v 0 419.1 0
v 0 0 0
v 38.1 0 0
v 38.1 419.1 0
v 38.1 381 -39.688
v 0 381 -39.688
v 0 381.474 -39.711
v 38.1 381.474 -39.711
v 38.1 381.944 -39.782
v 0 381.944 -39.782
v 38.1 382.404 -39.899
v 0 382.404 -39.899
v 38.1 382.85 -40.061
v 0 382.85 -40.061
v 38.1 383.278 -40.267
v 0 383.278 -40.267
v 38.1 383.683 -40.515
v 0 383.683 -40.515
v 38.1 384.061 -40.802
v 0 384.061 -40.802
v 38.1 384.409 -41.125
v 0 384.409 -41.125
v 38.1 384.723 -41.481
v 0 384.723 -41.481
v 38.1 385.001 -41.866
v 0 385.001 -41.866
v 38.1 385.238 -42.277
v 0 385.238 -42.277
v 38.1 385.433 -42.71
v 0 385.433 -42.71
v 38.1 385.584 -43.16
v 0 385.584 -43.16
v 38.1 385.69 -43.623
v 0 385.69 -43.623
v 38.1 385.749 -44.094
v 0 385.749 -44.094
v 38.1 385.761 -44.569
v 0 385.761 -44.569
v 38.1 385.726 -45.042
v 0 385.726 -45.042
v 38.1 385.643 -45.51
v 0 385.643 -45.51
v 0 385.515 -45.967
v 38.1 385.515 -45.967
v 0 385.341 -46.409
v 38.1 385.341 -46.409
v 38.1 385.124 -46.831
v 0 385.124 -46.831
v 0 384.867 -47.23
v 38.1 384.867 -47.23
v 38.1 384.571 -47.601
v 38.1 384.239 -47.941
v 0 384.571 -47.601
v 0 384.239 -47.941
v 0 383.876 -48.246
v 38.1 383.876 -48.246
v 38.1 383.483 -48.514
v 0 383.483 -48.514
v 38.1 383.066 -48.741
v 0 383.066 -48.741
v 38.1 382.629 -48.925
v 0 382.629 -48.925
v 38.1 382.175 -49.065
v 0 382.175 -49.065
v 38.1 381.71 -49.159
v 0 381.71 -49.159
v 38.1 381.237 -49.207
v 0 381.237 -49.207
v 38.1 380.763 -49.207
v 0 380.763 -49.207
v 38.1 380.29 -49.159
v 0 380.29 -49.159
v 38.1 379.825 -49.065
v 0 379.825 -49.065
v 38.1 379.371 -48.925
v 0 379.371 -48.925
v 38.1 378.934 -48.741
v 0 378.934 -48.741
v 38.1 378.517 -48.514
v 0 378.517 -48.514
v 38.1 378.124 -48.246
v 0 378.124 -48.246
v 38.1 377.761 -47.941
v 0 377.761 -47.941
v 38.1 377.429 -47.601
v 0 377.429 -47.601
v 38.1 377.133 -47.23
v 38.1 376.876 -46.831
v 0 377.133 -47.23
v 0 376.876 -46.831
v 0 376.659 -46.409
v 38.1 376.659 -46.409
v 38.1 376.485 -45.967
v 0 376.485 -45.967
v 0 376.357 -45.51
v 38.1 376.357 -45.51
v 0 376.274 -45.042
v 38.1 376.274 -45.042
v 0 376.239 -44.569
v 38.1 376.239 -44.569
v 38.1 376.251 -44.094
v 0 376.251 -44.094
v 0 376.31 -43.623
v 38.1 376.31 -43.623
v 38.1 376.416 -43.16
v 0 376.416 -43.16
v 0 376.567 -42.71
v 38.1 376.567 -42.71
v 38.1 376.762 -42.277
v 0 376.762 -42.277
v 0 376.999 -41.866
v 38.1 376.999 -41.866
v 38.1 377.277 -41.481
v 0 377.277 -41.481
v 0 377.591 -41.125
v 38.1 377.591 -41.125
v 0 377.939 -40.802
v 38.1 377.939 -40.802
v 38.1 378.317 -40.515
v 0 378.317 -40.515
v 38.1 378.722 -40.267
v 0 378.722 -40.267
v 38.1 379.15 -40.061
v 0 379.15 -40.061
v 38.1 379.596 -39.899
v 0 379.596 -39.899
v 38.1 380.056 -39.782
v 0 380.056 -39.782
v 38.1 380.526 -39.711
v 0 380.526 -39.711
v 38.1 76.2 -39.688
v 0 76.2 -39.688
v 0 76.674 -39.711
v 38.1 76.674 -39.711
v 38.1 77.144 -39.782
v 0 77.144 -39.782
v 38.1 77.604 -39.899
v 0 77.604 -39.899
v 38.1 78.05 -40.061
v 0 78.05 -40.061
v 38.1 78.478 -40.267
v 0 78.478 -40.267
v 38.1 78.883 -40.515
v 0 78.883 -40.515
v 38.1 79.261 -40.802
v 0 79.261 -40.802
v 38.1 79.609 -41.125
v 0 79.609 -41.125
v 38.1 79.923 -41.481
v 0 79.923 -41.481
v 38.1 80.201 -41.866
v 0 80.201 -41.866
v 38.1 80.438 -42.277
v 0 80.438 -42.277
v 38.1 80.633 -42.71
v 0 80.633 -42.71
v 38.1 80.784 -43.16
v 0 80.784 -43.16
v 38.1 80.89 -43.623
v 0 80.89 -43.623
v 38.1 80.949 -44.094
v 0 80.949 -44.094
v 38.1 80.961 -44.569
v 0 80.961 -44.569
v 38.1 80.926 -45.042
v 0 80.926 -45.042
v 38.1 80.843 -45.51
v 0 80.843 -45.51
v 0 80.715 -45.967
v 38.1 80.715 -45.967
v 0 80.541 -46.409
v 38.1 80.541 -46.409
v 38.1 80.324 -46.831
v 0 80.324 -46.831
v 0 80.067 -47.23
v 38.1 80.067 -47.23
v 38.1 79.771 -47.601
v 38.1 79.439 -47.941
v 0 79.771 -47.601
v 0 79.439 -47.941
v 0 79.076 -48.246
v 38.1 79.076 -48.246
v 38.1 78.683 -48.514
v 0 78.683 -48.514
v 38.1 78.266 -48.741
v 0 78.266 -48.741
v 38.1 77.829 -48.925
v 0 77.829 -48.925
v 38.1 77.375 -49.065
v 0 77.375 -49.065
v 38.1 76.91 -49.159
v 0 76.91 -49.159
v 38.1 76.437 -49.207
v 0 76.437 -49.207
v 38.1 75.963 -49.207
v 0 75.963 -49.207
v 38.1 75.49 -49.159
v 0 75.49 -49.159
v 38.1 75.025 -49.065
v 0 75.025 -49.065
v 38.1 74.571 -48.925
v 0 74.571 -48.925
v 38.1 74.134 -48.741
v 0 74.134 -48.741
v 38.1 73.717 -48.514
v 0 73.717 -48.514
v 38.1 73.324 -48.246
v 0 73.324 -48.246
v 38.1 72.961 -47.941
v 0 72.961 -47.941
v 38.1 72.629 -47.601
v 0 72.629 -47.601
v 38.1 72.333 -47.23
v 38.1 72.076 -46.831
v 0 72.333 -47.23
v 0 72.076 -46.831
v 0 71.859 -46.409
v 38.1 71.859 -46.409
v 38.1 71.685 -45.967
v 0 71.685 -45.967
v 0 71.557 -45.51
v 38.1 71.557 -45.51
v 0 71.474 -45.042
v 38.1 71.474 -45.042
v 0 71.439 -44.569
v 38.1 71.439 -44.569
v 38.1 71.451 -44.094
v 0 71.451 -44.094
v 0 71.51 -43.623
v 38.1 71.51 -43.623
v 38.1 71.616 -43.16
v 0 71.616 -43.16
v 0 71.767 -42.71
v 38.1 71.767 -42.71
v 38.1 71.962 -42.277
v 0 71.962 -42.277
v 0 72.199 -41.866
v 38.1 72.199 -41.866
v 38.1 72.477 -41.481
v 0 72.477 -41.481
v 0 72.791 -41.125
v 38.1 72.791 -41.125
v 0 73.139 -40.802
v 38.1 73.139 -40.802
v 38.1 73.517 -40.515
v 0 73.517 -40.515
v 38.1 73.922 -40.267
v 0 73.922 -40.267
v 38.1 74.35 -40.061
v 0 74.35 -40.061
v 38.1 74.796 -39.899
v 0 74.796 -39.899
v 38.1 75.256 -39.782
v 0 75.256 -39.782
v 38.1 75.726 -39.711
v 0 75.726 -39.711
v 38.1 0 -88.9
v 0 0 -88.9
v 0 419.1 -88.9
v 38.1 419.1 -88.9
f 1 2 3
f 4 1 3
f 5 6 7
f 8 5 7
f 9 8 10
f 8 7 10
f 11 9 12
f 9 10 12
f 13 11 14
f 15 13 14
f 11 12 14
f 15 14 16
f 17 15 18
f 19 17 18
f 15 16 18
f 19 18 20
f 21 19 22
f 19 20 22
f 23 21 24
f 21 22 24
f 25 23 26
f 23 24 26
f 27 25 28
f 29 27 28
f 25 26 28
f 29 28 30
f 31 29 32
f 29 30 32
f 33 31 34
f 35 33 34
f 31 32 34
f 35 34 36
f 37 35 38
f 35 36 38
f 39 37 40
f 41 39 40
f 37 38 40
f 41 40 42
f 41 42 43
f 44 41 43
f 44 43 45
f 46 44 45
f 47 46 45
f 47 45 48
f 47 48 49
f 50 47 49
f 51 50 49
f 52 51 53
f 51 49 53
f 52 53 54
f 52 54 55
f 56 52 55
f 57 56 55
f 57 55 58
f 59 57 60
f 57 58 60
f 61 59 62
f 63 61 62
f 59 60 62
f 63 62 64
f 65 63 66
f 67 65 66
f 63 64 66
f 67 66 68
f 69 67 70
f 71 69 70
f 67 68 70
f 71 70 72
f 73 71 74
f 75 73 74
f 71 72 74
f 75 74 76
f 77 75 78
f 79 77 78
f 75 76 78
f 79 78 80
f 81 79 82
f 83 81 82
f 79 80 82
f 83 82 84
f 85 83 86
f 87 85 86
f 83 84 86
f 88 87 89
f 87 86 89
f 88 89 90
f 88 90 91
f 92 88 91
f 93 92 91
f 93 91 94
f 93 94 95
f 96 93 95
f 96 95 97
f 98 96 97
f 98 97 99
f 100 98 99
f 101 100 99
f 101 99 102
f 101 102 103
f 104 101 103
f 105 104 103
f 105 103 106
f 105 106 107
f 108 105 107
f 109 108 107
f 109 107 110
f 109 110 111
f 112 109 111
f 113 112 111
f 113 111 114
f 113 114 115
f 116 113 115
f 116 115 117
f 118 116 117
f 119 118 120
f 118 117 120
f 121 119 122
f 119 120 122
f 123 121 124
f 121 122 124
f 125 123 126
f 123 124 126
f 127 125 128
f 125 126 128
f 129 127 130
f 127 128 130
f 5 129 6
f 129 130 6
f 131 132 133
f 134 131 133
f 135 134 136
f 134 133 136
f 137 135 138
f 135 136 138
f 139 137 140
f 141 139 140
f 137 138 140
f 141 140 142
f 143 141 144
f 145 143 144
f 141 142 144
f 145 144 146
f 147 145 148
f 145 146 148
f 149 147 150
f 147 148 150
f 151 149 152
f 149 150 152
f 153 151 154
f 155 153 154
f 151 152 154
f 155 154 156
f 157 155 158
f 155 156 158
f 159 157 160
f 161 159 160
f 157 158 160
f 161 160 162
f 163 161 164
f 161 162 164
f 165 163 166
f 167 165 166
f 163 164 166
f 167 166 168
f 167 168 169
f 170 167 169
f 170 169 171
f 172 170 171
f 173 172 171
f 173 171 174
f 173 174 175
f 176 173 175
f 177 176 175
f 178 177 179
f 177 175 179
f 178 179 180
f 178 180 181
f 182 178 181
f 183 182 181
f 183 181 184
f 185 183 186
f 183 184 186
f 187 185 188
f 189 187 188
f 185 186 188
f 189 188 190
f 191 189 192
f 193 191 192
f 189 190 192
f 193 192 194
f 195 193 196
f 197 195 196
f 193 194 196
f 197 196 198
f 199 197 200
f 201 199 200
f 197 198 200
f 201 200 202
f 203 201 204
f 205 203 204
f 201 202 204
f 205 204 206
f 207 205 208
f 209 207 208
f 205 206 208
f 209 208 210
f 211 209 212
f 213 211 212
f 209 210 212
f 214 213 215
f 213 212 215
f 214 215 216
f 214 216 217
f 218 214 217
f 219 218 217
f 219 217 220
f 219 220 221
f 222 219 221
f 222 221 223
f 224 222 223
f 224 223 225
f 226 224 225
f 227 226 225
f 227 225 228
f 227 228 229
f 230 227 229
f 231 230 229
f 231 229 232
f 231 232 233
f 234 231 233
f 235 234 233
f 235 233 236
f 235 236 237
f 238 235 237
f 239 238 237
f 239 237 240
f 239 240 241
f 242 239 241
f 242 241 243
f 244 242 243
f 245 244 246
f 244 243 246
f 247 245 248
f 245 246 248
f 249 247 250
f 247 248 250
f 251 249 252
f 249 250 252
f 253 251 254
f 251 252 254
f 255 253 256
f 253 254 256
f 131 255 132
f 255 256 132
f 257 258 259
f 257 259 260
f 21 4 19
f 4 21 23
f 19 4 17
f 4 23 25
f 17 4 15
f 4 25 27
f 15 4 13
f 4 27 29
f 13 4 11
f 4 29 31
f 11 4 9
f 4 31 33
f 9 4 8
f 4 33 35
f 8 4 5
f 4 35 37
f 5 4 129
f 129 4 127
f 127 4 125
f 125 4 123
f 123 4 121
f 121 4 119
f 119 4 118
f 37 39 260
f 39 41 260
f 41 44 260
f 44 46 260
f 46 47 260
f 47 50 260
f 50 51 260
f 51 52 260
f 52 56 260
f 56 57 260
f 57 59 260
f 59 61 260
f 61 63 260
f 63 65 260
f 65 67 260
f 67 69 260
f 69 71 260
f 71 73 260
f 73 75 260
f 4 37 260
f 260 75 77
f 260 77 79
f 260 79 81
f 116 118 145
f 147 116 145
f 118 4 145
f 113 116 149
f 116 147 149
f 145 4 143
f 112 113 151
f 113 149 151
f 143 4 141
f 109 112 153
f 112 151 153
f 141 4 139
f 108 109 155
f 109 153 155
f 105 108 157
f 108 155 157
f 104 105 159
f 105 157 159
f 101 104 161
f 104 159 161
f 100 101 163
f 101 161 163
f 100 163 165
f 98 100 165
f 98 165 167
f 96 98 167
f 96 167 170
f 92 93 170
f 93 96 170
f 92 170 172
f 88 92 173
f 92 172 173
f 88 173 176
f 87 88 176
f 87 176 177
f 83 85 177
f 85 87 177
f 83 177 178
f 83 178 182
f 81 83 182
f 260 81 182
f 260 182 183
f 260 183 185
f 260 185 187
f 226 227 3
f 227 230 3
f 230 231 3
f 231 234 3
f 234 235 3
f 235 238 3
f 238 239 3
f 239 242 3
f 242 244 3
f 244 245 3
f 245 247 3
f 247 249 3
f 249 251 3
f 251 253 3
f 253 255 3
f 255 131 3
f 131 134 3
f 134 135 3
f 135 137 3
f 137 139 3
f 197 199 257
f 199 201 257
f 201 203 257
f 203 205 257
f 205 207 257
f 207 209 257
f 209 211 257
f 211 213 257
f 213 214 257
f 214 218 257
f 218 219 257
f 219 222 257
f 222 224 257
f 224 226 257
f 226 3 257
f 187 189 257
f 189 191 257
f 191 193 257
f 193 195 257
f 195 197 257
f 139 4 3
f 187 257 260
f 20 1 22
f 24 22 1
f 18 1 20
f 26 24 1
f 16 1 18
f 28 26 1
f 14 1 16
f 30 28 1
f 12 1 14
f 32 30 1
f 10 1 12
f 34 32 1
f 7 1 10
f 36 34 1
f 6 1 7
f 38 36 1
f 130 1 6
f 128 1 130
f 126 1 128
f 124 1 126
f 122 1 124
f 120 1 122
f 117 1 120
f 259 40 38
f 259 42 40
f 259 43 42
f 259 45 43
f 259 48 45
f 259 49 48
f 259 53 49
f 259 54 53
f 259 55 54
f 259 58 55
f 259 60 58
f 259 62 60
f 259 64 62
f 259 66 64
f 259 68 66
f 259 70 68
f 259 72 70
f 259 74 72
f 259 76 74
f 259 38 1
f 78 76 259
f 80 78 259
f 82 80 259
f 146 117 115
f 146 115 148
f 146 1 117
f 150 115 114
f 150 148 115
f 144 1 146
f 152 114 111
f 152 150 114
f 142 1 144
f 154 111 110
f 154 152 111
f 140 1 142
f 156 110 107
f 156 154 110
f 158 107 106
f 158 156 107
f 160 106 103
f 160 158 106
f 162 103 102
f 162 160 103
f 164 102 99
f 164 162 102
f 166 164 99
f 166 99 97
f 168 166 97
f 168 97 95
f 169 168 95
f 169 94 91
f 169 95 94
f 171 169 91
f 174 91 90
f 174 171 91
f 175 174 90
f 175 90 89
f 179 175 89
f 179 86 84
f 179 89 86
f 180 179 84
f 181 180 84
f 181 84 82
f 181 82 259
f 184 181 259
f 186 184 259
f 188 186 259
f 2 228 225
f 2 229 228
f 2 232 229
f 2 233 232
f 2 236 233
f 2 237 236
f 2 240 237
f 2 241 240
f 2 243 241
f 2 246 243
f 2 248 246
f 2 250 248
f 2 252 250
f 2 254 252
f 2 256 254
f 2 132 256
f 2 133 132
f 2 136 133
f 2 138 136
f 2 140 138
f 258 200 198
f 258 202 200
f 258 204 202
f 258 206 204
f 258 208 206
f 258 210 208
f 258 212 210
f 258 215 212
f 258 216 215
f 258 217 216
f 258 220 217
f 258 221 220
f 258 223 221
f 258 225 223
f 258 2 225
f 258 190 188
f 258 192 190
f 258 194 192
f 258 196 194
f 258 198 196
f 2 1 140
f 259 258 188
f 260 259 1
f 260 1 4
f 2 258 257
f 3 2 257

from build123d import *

# Parameters (mm, degrees)
SKETCH1_W           = 38.1
SKETCH1_H           = 88.9
BOSS_EXTRUDE1_DEPTH = 419.1
SKETCH2_OUTSIDE_W   = 176.924
SKETCH2_OUTSIDE_H   = 507.124
SKETCH2_OUTSIDE_W_2 = 88.9
SKETCH2_OUTSIDE_H_2 = 419.1
SKETCH2_OUTSIDE_R   = 4.7625
CUT_EXTRUDE1_DEPTH  = 38.1


with BuildPart() as part:
    # Sketch1 → Boss-Extrude1 (new body)
    with BuildSketch(Plane(origin=(0, 0, 0), x_dir=(1, 0, 0), z_dir=(0, 1, 0))):
        with Locations((19.05, 44.45)):
            Rectangle(SKETCH1_W, SKETCH1_H)
    extrude(amount=BOSS_EXTRUDE1_DEPTH)

    # Sketch2 outside → Cut-Extrude1 (cut)
    # profile 1 of 3: a face of its own
    with BuildSketch(Plane.ZY):
        with Locations((-44.45, 209.55)):
            Rectangle(SKETCH2_OUTSIDE_W, SKETCH2_OUTSIDE_H)
        with Locations((-44.45, 209.55)):
            Rectangle(SKETCH2_OUTSIDE_W_2, SKETCH2_OUTSIDE_H_2, mode=Mode.SUBTRACT)
    # profile 2 of 3: a face of its own
    with BuildSketch(Plane.ZY):
        with Locations((-44.45, 381)):
            Circle(SKETCH2_OUTSIDE_R)
    # profile 3 of 3: a face of its own
    with BuildSketch(Plane.ZY):
        with Locations((-44.45, 76.2)):
            Circle(SKETCH2_OUTSIDE_R)
    extrude(amount=-CUT_EXTRUDE1_DEPTH, mode=Mode.SUBTRACT)


solid = part.part
